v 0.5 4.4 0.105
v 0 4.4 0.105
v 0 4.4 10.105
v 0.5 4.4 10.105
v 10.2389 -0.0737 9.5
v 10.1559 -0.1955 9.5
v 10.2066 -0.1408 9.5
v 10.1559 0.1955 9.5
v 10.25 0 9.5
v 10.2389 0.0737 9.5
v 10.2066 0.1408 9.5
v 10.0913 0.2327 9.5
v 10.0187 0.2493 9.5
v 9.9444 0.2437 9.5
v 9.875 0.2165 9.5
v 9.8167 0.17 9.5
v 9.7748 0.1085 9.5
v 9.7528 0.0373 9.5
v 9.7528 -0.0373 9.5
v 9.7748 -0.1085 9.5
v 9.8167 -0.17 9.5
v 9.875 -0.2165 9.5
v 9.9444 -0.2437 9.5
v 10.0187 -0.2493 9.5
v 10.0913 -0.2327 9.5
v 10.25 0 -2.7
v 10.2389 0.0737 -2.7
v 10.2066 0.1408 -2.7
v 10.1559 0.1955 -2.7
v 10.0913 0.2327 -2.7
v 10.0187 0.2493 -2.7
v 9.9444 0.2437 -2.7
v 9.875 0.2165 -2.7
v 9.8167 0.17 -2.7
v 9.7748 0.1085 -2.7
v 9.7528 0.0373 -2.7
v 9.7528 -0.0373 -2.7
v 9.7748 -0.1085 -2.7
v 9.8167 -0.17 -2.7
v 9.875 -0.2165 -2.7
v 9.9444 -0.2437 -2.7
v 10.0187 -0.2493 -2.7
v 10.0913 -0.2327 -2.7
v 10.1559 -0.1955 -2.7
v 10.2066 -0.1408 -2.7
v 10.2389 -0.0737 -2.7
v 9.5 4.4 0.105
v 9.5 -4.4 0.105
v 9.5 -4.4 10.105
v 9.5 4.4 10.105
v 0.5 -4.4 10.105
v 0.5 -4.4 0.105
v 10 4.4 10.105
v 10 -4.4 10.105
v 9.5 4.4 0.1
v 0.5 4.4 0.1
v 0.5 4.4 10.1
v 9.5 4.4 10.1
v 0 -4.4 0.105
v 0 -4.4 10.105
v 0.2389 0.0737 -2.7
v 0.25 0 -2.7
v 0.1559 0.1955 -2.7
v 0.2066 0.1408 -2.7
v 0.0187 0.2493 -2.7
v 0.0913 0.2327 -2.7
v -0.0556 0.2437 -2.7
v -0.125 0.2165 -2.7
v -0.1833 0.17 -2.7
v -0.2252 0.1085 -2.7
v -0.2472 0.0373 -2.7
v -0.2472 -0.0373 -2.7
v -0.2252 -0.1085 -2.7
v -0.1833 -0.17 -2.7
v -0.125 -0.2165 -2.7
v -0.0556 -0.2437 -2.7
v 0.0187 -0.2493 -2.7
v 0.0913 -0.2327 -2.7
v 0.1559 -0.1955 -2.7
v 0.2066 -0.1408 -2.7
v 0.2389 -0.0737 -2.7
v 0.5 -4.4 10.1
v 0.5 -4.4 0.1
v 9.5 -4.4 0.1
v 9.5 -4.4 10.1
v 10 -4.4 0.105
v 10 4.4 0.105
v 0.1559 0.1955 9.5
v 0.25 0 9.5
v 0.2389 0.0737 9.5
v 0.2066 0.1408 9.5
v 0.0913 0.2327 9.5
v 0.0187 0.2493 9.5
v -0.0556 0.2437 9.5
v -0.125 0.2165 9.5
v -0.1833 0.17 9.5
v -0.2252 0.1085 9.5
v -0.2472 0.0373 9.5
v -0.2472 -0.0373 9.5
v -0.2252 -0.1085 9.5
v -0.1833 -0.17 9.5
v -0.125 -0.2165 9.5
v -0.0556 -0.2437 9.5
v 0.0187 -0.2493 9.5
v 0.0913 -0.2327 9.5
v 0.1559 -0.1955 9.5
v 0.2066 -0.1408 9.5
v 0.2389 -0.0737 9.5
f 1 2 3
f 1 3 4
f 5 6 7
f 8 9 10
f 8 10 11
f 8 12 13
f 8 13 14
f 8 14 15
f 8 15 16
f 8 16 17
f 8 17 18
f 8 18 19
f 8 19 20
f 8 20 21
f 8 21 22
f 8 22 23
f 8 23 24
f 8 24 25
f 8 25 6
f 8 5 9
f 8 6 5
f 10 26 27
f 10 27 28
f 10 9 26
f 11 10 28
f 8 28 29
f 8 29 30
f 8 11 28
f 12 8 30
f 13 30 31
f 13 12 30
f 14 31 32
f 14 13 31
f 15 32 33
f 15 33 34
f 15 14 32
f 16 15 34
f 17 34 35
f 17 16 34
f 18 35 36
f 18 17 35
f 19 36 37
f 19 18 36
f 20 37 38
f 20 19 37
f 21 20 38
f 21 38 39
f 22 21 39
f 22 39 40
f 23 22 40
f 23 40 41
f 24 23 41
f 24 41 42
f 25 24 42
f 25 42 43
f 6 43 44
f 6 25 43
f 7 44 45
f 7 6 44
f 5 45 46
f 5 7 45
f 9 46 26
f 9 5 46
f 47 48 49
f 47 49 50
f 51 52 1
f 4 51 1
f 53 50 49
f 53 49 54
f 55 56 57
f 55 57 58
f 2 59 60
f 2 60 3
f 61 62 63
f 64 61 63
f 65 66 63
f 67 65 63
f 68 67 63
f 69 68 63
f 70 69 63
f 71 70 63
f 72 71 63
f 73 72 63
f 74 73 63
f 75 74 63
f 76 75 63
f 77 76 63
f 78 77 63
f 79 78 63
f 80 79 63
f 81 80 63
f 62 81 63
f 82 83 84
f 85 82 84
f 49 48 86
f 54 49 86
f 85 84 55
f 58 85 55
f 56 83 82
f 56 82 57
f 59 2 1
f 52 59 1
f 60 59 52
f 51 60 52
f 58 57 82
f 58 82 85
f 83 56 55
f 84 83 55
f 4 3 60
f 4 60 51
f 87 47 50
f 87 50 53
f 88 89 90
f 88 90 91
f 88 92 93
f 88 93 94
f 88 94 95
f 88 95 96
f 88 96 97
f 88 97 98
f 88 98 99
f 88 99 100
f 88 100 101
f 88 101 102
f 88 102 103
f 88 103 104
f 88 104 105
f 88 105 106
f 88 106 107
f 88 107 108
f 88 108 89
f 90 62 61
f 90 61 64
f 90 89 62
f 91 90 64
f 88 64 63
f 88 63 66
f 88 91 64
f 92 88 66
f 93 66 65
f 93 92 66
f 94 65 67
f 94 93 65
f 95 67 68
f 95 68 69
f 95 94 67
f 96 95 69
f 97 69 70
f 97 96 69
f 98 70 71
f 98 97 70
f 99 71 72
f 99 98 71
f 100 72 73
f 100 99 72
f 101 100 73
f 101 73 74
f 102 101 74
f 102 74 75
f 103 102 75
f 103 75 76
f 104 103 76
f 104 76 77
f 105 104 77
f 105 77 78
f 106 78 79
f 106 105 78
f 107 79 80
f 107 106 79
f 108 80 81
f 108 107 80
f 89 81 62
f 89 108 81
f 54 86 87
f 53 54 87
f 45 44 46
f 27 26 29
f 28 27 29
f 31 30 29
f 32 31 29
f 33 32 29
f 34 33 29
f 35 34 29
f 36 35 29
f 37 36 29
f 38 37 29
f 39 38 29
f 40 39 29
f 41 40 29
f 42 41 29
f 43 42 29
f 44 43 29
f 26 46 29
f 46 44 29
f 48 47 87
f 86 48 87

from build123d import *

# Parameters (mm, degrees)
SKETCH_W          = 9
SKETCH_H          = 8.8
PAD_DEPTH         = 10
SKETCH001_R       = 0.25
PAD001_DEPTH      = 9
PAD001_DEPTH_BACK = 3.2
SKETCH002_W       = 0.5
SKETCH002_H       = 8.8
PAD002_DEPTH      = 10


with BuildPart() as pad:
    # Sketch → Pad (new body)
    with BuildSketch(Plane.XY.offset(0.1)):
        with Locations((5, 0)):
            Rectangle(SKETCH_W, SKETCH_H)
    extrude(amount=PAD_DEPTH)


with BuildPart() as pad001:
    # Sketch001 → Pad001 (new body, two sides)
    with BuildSketch(Plane.XY.offset(0.5)) as pad001_sk:
        Circle(SKETCH001_R)
        with Locations((10, 0)):
            Circle(SKETCH001_R)
    extrude(amount=PAD001_DEPTH)
    extrude(pad001_sk.sketch, amount=-PAD001_DEPTH_BACK)


with BuildPart() as pad002:
    # Sketch002 → Pad002 (new body)
    with BuildSketch(Plane.XY.offset(0.105)):
        with Locations((0.25, 0)):
            Rectangle(SKETCH002_W, SKETCH002_H)
        with Locations((9.75, 0)):
            Rectangle(SKETCH002_W, SKETCH002_H)
    extrude(amount=PAD002_DEPTH)


solid = Compound([pad.part, pad001.part, pad002.part])
